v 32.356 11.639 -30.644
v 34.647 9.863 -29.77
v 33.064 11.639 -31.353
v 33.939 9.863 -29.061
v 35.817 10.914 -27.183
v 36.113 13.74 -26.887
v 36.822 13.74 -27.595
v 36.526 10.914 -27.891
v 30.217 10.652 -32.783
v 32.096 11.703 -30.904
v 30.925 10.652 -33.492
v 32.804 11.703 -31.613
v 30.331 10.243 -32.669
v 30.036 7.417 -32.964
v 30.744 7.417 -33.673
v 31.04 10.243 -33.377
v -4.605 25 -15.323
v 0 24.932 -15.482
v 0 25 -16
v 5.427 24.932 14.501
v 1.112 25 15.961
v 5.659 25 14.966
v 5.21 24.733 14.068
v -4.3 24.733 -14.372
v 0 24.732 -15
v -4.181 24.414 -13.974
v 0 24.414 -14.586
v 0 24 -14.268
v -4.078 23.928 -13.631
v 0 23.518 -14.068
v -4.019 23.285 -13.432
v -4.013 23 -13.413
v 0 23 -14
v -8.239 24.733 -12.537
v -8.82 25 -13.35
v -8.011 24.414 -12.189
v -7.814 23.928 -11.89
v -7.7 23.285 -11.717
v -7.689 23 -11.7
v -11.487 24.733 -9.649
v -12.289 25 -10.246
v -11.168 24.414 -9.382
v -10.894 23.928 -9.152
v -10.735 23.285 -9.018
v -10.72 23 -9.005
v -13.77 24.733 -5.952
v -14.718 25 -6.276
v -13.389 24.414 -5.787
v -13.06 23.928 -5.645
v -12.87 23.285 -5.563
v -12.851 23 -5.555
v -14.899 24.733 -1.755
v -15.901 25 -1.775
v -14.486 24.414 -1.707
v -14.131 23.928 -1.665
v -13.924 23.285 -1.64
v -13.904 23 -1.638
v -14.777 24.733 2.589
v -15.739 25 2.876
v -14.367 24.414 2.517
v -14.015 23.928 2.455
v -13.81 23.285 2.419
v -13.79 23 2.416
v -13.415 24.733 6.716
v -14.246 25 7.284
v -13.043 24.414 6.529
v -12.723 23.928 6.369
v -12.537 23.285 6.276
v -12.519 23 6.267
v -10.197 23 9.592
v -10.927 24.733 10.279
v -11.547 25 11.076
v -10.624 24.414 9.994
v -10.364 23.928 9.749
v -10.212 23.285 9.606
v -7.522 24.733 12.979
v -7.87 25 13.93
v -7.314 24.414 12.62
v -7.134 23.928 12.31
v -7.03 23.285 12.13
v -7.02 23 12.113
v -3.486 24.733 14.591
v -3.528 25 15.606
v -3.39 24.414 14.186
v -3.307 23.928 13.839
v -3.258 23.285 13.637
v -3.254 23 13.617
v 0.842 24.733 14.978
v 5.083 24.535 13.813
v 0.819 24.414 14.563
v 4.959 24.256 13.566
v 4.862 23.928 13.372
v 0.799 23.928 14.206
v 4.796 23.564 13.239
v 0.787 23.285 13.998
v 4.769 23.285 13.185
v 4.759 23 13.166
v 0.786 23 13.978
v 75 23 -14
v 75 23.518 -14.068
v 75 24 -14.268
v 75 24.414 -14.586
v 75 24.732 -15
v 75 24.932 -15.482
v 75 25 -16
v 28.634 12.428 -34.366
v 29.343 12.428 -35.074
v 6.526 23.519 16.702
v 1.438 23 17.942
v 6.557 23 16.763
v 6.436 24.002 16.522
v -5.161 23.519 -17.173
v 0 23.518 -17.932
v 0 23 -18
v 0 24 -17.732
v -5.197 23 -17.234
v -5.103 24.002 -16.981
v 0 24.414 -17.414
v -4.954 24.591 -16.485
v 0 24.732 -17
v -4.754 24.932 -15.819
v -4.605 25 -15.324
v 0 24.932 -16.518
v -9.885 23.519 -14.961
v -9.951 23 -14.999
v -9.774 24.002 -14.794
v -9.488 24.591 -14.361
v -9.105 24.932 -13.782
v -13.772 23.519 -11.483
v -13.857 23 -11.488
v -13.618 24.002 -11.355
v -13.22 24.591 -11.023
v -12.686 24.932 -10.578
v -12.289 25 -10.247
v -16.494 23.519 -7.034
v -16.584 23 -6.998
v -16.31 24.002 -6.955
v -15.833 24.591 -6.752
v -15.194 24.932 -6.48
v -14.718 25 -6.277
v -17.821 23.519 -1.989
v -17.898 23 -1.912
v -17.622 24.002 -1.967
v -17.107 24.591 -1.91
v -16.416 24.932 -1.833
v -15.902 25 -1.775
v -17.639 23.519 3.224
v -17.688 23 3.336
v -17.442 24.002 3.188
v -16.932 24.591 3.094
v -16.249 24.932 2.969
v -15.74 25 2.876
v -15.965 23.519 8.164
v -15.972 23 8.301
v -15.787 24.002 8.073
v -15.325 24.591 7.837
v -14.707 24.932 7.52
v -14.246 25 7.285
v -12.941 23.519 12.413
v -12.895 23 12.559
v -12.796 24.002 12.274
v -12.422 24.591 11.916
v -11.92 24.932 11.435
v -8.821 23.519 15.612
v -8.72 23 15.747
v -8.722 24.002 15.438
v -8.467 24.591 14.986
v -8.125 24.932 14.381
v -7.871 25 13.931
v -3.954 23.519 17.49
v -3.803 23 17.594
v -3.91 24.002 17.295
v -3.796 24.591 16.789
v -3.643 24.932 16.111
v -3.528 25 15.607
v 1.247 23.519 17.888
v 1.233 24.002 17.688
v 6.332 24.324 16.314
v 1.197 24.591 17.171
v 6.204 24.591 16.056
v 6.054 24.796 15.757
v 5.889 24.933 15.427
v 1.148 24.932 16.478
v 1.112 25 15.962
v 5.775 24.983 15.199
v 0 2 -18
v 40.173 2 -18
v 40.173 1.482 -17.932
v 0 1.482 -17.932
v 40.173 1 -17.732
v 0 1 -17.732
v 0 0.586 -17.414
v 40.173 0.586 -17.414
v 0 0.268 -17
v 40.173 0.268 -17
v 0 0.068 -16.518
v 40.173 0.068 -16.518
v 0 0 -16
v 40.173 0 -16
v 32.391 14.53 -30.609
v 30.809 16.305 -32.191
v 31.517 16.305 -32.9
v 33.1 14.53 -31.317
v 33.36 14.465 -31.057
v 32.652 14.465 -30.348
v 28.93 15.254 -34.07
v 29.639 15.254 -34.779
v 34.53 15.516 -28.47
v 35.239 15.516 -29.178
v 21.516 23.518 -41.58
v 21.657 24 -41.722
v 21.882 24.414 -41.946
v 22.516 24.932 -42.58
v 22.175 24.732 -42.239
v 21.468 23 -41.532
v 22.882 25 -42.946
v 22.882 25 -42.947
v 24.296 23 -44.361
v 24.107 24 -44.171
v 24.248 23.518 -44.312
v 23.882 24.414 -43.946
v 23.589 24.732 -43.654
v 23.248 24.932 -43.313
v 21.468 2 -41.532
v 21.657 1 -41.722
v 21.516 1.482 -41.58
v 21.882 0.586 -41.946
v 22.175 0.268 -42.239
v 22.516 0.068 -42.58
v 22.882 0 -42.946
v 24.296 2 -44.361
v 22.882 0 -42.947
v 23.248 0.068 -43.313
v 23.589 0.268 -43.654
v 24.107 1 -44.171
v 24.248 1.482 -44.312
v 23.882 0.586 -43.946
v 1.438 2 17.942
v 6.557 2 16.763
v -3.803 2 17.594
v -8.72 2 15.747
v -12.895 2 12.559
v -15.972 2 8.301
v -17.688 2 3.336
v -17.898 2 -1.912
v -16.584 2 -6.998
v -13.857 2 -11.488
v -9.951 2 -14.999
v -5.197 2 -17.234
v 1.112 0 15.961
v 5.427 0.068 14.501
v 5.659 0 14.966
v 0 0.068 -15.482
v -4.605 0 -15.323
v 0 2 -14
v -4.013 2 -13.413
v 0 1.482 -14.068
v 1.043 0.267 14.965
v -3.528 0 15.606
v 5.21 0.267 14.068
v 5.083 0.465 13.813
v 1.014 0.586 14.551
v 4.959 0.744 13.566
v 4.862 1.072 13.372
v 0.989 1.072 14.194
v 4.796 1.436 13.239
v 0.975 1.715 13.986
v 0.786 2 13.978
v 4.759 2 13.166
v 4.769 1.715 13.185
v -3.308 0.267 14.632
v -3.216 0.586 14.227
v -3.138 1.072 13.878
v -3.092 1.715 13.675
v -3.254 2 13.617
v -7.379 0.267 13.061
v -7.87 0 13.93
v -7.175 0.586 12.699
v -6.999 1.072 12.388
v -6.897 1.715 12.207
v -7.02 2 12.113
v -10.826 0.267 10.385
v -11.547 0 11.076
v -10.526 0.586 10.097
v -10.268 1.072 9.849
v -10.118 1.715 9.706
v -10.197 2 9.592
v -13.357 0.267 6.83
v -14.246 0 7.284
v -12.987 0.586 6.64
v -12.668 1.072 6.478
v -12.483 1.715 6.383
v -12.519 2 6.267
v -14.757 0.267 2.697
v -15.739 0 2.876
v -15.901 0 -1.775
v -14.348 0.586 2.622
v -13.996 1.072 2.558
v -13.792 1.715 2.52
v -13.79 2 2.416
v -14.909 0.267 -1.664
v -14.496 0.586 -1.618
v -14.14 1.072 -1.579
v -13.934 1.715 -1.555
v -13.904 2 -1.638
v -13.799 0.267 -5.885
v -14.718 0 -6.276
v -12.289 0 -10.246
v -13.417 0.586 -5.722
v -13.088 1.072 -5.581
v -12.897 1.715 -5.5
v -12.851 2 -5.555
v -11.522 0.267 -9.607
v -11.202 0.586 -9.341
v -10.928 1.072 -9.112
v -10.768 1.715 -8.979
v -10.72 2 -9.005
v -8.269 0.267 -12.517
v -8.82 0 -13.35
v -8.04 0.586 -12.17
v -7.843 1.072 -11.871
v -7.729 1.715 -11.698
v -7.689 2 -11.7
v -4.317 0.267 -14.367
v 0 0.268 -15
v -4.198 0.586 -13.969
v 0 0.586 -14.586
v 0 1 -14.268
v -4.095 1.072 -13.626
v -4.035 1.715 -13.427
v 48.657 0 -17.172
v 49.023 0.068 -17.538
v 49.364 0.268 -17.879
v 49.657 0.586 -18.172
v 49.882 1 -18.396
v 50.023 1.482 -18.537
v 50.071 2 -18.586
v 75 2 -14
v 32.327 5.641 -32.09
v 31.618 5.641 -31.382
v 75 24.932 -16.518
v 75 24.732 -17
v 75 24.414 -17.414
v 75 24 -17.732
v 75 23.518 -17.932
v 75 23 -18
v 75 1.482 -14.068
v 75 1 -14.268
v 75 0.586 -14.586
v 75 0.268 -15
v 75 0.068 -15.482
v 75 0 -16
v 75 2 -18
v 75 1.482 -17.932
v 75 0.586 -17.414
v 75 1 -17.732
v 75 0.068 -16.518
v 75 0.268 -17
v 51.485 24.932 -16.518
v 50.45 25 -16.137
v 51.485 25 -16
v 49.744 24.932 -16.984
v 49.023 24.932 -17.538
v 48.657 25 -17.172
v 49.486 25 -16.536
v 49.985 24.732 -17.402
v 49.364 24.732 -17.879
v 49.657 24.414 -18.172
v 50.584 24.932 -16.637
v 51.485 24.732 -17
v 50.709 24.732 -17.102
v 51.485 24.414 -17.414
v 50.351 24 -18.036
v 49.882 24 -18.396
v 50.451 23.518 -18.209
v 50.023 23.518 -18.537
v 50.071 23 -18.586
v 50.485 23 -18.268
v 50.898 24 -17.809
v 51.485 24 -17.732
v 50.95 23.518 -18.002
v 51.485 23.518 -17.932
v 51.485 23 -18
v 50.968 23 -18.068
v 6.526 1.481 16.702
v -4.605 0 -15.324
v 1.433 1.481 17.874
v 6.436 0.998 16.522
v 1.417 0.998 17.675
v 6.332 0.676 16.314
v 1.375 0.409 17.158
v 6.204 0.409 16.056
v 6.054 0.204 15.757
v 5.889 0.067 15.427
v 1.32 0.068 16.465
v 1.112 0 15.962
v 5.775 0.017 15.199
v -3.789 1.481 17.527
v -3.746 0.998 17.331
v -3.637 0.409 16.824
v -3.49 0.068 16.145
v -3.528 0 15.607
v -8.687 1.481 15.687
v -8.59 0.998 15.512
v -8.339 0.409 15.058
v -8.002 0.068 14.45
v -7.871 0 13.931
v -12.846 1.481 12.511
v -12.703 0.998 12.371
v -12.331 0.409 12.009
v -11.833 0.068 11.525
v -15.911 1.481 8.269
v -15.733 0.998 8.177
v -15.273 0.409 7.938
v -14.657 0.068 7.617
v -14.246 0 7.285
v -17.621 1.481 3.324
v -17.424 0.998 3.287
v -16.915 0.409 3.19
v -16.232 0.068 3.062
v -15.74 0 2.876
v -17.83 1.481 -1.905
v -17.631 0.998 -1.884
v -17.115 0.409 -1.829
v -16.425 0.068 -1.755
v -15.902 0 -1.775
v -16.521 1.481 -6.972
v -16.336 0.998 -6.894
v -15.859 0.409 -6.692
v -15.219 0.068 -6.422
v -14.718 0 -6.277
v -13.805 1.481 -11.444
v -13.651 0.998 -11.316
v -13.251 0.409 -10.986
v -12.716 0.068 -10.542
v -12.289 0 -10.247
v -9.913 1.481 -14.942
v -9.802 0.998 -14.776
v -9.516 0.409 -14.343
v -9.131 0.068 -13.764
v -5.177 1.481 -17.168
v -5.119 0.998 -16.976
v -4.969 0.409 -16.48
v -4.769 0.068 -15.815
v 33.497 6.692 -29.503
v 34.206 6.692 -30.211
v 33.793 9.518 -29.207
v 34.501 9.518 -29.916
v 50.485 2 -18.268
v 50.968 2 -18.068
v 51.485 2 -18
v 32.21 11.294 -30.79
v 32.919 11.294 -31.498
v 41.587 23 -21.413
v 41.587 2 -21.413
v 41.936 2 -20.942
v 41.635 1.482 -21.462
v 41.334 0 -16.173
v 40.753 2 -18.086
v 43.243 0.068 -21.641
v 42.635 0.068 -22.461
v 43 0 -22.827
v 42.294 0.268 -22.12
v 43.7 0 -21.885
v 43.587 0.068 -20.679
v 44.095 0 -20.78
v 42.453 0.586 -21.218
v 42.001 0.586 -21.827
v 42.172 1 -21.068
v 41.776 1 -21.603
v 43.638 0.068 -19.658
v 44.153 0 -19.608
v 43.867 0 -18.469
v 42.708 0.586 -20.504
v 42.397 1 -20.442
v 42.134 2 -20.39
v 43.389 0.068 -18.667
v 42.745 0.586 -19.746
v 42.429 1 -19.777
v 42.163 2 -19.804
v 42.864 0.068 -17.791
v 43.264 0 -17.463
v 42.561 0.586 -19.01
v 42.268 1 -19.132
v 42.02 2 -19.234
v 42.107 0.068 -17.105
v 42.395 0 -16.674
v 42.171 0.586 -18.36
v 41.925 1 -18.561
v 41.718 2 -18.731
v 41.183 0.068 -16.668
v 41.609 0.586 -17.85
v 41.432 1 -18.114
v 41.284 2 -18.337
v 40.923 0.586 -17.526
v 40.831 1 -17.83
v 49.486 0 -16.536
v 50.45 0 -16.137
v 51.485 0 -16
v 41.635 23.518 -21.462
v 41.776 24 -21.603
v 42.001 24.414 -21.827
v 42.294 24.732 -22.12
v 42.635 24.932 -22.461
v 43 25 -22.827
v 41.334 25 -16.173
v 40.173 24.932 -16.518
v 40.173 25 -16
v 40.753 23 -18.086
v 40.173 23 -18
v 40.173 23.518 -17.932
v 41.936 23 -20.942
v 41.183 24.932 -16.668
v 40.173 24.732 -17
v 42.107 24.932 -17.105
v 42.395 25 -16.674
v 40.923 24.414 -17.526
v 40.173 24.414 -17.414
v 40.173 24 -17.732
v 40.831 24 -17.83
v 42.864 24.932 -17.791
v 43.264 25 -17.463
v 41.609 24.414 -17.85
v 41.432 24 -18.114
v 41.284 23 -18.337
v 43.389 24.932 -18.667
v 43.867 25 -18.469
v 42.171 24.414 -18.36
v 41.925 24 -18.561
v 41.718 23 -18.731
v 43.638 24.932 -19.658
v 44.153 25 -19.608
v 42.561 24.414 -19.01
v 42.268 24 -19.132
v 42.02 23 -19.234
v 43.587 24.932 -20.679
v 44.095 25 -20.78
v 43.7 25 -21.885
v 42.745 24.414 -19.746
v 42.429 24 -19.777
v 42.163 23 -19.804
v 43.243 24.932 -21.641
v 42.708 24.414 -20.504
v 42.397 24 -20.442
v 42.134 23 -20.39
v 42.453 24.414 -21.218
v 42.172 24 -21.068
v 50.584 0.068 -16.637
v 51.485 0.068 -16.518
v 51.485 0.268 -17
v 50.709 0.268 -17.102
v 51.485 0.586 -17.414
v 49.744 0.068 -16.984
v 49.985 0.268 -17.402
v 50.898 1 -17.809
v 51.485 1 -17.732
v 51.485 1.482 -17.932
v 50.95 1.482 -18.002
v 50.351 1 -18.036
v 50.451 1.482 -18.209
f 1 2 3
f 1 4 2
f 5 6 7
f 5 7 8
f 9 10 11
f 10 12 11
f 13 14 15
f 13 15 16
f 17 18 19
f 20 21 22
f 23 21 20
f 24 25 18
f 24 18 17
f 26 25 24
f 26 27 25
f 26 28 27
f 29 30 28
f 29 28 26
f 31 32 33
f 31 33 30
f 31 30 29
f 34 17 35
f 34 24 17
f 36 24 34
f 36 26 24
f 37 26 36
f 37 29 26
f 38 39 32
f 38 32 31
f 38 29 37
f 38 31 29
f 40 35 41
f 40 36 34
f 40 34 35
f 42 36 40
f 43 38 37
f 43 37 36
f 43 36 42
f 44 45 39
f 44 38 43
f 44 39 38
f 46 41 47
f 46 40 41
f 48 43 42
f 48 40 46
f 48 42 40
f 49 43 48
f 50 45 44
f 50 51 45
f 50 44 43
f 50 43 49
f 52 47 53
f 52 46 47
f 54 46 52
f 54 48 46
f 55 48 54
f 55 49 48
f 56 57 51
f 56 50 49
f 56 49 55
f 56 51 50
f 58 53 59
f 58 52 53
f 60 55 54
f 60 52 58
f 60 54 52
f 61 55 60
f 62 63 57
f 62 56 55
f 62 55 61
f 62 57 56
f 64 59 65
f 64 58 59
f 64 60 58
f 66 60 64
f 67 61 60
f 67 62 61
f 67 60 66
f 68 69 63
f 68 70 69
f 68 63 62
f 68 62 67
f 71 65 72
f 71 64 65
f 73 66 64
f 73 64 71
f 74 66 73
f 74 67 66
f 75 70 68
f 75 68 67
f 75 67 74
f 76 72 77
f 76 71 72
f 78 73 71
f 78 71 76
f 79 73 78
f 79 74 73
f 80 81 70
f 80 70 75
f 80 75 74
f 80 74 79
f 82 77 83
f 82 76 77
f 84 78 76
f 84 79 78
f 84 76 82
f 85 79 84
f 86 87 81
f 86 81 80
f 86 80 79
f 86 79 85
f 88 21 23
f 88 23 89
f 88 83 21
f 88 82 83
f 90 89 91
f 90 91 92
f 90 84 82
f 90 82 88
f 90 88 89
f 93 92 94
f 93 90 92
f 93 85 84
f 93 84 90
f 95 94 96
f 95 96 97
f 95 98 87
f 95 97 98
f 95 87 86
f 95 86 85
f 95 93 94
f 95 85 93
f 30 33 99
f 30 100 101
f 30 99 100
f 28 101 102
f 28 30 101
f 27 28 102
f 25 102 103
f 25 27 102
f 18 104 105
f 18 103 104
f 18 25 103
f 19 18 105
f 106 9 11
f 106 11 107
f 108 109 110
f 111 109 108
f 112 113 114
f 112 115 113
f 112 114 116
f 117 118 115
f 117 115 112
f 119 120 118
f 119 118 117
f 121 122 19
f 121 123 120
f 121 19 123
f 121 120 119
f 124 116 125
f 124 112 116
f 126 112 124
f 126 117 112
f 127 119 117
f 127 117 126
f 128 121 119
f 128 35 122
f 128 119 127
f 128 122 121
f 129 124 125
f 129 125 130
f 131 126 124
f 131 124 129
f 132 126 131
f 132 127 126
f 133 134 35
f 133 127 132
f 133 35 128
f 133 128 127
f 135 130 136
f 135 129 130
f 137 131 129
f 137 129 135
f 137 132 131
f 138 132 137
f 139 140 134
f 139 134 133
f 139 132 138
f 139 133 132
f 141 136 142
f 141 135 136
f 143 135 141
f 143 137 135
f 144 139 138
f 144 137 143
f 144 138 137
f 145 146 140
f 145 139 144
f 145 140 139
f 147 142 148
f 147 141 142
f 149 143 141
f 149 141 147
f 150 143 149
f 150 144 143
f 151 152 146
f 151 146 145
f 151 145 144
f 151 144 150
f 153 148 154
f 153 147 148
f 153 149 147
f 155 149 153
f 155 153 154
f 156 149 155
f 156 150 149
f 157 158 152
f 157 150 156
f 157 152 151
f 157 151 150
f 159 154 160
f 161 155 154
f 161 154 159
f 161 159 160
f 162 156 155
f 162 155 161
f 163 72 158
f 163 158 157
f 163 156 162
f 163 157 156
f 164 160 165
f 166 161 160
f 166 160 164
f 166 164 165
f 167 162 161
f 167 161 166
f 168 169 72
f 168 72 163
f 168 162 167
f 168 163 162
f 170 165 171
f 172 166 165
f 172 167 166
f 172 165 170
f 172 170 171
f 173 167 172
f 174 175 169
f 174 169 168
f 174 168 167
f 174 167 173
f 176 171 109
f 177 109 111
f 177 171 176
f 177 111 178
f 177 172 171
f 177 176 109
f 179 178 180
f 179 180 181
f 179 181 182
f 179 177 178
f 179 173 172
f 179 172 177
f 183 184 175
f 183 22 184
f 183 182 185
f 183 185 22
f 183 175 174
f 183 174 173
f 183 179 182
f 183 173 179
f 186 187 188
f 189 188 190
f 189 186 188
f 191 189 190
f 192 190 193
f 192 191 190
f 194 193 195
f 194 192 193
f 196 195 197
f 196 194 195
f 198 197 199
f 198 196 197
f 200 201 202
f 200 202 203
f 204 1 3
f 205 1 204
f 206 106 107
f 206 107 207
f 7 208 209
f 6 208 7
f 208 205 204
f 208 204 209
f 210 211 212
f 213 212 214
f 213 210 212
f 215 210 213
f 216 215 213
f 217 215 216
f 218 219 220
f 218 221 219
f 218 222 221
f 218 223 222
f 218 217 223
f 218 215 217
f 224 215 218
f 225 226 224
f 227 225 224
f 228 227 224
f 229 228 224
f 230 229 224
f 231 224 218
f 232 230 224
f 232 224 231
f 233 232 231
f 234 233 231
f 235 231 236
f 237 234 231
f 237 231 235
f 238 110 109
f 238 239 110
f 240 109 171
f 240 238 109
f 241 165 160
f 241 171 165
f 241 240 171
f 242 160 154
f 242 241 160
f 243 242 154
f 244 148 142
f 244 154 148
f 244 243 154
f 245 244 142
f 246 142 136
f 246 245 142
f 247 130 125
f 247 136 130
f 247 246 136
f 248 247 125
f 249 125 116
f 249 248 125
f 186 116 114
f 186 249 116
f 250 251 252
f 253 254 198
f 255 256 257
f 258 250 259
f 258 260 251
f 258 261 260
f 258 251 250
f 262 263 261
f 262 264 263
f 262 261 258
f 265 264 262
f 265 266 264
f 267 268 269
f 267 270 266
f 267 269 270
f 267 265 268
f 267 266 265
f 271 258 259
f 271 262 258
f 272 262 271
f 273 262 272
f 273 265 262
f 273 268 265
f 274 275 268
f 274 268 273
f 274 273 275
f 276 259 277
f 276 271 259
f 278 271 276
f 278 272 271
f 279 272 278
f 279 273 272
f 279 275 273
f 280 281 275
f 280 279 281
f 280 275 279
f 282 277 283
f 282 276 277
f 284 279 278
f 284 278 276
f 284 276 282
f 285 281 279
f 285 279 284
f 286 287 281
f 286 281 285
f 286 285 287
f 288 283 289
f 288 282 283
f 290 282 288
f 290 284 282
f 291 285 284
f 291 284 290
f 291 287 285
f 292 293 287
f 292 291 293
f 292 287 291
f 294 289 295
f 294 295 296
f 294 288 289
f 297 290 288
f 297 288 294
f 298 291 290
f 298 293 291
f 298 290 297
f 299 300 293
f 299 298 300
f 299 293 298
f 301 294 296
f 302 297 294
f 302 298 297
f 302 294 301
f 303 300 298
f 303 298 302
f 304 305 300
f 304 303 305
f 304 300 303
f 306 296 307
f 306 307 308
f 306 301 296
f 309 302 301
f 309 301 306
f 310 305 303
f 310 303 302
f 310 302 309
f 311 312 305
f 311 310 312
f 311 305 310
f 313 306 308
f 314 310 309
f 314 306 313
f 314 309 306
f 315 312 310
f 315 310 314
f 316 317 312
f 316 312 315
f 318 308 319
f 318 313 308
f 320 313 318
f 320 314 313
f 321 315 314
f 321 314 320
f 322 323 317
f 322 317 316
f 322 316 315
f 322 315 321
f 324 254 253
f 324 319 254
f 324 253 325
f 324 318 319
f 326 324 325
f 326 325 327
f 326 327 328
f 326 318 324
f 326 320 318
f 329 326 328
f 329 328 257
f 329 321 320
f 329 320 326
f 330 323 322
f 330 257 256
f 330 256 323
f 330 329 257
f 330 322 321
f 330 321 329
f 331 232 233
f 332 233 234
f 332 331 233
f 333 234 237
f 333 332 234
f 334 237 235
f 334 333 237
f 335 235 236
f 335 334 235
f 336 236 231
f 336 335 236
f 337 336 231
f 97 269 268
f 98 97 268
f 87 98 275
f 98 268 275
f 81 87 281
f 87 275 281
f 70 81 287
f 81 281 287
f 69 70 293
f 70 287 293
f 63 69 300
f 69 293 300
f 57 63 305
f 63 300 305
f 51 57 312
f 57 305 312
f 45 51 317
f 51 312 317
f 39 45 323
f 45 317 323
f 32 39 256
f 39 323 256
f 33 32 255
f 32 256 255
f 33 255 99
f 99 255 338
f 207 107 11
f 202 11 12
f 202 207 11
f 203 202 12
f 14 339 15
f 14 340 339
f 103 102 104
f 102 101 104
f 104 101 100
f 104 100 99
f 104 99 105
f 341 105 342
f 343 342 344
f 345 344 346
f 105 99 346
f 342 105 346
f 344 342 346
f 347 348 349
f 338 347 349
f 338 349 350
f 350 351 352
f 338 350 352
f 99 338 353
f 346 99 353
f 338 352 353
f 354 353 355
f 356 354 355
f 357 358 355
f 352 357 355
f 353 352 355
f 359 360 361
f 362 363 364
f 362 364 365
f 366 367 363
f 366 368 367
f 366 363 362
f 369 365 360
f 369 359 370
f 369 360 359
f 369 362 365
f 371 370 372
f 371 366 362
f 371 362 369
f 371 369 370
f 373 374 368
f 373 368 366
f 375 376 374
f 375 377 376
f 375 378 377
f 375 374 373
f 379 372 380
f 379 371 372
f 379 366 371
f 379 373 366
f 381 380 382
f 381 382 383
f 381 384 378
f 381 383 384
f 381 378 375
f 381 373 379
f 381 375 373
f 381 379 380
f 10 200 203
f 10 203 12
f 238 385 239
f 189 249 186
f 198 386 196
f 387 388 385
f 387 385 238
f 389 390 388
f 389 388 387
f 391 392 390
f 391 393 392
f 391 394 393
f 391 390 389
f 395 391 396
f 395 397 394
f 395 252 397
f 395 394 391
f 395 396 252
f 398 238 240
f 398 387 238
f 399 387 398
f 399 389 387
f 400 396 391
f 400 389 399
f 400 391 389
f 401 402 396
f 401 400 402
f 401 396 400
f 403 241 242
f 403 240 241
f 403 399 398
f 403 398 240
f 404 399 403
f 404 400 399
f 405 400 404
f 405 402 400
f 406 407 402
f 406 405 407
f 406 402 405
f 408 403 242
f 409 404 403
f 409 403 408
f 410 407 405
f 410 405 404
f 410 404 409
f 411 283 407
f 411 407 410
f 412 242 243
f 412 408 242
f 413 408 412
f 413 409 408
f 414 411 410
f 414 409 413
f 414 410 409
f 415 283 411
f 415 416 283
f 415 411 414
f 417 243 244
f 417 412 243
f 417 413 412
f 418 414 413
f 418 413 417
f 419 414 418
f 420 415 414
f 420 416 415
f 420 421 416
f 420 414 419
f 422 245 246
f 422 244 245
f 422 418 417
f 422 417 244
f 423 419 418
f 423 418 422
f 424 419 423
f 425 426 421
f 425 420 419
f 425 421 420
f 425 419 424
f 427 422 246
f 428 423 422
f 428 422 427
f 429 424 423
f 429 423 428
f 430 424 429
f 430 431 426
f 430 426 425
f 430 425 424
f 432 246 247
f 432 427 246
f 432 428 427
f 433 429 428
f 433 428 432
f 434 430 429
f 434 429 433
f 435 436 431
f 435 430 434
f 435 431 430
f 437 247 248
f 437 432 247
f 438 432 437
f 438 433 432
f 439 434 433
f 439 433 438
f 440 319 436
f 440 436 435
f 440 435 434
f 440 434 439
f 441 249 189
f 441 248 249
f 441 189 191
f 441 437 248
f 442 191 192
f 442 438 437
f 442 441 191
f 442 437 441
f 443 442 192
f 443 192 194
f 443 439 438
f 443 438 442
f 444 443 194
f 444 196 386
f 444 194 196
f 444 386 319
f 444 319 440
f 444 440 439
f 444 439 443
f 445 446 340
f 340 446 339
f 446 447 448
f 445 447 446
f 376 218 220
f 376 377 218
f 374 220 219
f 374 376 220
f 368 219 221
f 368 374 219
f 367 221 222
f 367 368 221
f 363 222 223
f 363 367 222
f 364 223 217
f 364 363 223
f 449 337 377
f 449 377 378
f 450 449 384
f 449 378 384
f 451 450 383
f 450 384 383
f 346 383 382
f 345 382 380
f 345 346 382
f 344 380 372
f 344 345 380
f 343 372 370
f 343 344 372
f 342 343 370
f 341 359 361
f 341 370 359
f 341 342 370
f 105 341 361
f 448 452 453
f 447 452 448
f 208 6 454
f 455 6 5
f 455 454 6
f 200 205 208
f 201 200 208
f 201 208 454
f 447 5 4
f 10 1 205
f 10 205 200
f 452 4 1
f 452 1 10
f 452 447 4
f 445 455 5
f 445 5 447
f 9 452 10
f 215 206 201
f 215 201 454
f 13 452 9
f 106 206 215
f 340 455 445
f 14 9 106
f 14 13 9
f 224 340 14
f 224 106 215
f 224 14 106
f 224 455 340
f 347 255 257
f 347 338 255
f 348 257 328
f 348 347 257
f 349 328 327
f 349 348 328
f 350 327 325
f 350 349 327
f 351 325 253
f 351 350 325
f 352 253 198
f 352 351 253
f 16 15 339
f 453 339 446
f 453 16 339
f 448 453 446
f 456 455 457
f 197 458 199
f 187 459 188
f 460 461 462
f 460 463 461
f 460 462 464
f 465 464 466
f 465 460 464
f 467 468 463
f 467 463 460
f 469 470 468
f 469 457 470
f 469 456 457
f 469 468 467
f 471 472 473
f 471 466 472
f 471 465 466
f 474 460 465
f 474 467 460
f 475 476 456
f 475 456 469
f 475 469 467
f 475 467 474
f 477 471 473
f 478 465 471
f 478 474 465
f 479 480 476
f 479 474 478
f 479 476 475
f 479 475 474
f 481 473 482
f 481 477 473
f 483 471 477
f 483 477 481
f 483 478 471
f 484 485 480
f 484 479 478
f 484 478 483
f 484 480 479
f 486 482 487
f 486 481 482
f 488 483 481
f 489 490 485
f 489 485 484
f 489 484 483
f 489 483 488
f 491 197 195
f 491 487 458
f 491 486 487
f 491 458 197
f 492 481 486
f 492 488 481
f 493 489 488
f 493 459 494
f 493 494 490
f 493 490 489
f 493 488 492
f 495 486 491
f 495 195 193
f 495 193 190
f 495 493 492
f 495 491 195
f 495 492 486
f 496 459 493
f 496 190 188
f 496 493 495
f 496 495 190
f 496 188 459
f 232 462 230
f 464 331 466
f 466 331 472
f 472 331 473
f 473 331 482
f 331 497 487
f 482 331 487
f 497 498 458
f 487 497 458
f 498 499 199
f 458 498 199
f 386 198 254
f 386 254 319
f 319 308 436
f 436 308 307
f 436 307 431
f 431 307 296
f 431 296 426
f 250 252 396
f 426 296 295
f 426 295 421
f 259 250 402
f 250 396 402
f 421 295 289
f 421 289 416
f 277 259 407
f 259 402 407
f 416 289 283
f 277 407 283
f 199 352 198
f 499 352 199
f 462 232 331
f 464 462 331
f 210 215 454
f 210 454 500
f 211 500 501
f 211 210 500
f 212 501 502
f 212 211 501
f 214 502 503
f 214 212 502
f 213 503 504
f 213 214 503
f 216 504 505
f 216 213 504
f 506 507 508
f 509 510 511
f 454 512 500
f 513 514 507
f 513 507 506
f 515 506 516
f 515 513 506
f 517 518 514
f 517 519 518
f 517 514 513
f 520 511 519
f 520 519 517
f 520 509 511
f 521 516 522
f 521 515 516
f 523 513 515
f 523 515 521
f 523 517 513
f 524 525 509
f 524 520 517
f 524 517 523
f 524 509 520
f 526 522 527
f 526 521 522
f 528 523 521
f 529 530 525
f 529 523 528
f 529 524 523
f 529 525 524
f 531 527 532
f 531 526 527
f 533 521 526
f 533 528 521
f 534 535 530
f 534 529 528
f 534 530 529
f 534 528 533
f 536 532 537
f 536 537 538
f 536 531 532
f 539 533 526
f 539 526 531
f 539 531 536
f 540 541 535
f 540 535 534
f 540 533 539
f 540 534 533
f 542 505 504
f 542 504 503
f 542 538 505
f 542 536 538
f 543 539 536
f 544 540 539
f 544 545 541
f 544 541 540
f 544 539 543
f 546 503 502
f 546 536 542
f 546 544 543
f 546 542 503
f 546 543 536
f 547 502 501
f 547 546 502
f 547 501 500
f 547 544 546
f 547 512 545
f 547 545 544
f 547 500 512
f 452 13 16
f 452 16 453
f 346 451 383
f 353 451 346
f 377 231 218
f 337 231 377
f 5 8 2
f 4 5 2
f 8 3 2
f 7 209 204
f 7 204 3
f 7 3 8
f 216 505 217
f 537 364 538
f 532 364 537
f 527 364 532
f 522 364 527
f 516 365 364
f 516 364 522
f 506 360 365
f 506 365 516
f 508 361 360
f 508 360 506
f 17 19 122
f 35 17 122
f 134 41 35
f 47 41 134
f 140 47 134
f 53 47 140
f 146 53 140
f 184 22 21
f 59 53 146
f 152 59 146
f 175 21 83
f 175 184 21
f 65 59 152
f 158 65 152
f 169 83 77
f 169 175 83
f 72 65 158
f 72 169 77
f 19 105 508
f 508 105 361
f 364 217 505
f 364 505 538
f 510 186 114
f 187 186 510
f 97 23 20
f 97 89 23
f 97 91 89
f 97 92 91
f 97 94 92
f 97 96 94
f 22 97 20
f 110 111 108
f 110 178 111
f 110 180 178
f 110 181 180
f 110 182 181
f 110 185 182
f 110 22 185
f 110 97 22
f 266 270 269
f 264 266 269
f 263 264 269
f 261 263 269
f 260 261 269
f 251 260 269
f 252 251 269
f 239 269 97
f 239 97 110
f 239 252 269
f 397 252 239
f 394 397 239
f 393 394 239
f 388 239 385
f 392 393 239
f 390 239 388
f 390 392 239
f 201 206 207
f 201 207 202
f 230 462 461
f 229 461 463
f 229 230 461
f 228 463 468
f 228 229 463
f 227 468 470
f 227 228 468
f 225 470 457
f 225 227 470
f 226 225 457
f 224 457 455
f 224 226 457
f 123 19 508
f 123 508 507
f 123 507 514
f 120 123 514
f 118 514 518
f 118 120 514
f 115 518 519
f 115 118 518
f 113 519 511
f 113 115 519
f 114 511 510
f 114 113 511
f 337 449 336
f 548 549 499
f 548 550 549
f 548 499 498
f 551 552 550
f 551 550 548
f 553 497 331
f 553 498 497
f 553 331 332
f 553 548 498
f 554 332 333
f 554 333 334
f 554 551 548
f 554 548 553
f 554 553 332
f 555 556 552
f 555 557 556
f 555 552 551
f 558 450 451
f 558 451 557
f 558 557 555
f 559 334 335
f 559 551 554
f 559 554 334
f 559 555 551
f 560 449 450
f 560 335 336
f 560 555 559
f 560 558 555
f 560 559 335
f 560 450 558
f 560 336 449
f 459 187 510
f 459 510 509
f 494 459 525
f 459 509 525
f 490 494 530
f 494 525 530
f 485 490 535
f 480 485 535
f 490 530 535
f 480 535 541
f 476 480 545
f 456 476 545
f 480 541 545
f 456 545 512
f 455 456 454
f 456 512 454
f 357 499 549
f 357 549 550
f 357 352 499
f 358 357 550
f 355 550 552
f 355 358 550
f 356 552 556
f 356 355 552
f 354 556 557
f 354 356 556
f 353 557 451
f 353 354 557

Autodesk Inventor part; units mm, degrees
ref_plane "YZ Plane" through (0, 0, 0) normal (1, 0, 0) x (0, 1, 0)
ref_plane "XZ Plane" through (0, 0, 0) normal (0, 1, 0) x (-1, 0, 0)
ref_plane "XY Plane" through (0, 0, 0) normal (0, 0, 1) x (1, 0, 0)
sketch "Sketch1" plane through (0, 0, 0) normal (0, 1, 0) x (-1, 0, 0)
  line L0 (0, -14) -> (-75, -14)
  line L1 (-75, -14) -> (-75, -18)
  line L2 (-4.7594, 13.1662) -> (-6.5571, 16.7632)
  arc A0 (0, -14) -> (-4.7594, 13.1662) centre (0, 0) ccw
  arc A1 (0, -18) -> (-6.5571, 16.7632) centre (0, 0) ccw
  line L3 (-45, -18) -> (-21.4678, -41.5322)
  line L4 (-45, -18) -> (-11.7204, -18) construction
  line L5 (-21.4678, -41.5322) -> (-24.2962, -44.3606)
  line L6 (-24.2962, -44.3606) -> (-50.6569, -18)
  line L7 (0, -18) -> (-45, -18)
  line L8 (-50.6569, -18) -> (-75, -18)
  point P0 (0, 0)
  dimension "d3" = 75
  dimension "d4" = 14
  dimension "d5" = 18
  dimension "d6" = 45
  dimension "d7" = 4
  dimension "d8" = 4
extrude "Extrusion1" add sketch "Sketch1" along normal blind 25
fillet "Fillet1" radius 2 12 edges at (-17.6881, 0, 3.3364) (22.5, 0, -18) (62.8284, 0, -18) (62.8284, 25, -18) (50.6569, 12.5, -18) (33.2339, 0, -29.7661) (37.4765, 0, -31.1803) (37.4765, 25, -31.1803) (33.2339, 25, -29.7661) (45, 12.5, -18) (-17.6881, 25, 3.3364) (22.5, 25, -18)
fillet "Fillet2" radius 2 4 edges at (37.5, 0, -14) (-13.79, 0, 2.4159) (-13.79, 25, 2.4159) (37.5, 25, -14)
sketch "Sketch2" plane through (0, 23, -14) normal (0, 0, 1) x (1, 0, 0)
  point P0 (0, -23)
sketch "Sketch3" plane through (0, 23, -14) normal (0, 0, 1) x (1, 0, 0)
  point P0 (0, -23)
sketch "Sketch4" plane through (41.5858, 2, -21.4142) normal (-0.7071, 0, 0.7071) x (0.7071, 0, 0.7071)
  line L0 (-28.4512, 21) -> (0, 21) projected
  line L1 (-17.898, 13.2543) -> (-15.2412, 14.305)
  line L2 (-15.2412, 14.305) -> (-13.0028, 12.5295)
  line L3 (-13.0028, 12.5295) -> (-13.4212, 9.7033)
  line L4 (-13.4212, 9.7033) -> (-16.078, 8.6525)
  line L5 (-16.078, 8.6525) -> (-18.3165, 10.428)
  line L6 (-18.3165, 10.428) -> (-17.898, 13.2543)
  line L7 (-12.6348, 12.4651) -> (-9.978, 13.5159)
  line L8 (-9.978, 13.5159) -> (-7.7396, 11.7404)
  line L9 (-7.7396, 11.7404) -> (-8.158, 8.9141)
  line L10 (-8.158, 8.9141) -> (-10.8148, 7.8633)
  line L11 (-10.8148, 7.8633) -> (-13.0532, 9.6388)
  line L12 (-13.0532, 9.6388) -> (-12.6348, 12.4651)
  line L13 (-15.916, 8.2429) -> (-13.2592, 9.2936)
  line L14 (-13.2592, 9.2936) -> (-11.0208, 7.5181)
  line L15 (-11.0208, 7.5181) -> (-11.4392, 4.6919)
  line L16 (-11.4392, 4.6919) -> (-14.096, 3.6411)
  line L17 (-14.096, 3.6411) -> (-16.3345, 5.4166)
  line L18 (-16.3345, 5.4166) -> (-15.916, 8.2429)
  point P0 (-14.2635, -2)
  point P1 (-12.0615, 16.231)
extrude "Extrusion2" cut sketch "Sketch4" against normal blind 1 and the other way blind 5
properties part number "TubeRadiator"
